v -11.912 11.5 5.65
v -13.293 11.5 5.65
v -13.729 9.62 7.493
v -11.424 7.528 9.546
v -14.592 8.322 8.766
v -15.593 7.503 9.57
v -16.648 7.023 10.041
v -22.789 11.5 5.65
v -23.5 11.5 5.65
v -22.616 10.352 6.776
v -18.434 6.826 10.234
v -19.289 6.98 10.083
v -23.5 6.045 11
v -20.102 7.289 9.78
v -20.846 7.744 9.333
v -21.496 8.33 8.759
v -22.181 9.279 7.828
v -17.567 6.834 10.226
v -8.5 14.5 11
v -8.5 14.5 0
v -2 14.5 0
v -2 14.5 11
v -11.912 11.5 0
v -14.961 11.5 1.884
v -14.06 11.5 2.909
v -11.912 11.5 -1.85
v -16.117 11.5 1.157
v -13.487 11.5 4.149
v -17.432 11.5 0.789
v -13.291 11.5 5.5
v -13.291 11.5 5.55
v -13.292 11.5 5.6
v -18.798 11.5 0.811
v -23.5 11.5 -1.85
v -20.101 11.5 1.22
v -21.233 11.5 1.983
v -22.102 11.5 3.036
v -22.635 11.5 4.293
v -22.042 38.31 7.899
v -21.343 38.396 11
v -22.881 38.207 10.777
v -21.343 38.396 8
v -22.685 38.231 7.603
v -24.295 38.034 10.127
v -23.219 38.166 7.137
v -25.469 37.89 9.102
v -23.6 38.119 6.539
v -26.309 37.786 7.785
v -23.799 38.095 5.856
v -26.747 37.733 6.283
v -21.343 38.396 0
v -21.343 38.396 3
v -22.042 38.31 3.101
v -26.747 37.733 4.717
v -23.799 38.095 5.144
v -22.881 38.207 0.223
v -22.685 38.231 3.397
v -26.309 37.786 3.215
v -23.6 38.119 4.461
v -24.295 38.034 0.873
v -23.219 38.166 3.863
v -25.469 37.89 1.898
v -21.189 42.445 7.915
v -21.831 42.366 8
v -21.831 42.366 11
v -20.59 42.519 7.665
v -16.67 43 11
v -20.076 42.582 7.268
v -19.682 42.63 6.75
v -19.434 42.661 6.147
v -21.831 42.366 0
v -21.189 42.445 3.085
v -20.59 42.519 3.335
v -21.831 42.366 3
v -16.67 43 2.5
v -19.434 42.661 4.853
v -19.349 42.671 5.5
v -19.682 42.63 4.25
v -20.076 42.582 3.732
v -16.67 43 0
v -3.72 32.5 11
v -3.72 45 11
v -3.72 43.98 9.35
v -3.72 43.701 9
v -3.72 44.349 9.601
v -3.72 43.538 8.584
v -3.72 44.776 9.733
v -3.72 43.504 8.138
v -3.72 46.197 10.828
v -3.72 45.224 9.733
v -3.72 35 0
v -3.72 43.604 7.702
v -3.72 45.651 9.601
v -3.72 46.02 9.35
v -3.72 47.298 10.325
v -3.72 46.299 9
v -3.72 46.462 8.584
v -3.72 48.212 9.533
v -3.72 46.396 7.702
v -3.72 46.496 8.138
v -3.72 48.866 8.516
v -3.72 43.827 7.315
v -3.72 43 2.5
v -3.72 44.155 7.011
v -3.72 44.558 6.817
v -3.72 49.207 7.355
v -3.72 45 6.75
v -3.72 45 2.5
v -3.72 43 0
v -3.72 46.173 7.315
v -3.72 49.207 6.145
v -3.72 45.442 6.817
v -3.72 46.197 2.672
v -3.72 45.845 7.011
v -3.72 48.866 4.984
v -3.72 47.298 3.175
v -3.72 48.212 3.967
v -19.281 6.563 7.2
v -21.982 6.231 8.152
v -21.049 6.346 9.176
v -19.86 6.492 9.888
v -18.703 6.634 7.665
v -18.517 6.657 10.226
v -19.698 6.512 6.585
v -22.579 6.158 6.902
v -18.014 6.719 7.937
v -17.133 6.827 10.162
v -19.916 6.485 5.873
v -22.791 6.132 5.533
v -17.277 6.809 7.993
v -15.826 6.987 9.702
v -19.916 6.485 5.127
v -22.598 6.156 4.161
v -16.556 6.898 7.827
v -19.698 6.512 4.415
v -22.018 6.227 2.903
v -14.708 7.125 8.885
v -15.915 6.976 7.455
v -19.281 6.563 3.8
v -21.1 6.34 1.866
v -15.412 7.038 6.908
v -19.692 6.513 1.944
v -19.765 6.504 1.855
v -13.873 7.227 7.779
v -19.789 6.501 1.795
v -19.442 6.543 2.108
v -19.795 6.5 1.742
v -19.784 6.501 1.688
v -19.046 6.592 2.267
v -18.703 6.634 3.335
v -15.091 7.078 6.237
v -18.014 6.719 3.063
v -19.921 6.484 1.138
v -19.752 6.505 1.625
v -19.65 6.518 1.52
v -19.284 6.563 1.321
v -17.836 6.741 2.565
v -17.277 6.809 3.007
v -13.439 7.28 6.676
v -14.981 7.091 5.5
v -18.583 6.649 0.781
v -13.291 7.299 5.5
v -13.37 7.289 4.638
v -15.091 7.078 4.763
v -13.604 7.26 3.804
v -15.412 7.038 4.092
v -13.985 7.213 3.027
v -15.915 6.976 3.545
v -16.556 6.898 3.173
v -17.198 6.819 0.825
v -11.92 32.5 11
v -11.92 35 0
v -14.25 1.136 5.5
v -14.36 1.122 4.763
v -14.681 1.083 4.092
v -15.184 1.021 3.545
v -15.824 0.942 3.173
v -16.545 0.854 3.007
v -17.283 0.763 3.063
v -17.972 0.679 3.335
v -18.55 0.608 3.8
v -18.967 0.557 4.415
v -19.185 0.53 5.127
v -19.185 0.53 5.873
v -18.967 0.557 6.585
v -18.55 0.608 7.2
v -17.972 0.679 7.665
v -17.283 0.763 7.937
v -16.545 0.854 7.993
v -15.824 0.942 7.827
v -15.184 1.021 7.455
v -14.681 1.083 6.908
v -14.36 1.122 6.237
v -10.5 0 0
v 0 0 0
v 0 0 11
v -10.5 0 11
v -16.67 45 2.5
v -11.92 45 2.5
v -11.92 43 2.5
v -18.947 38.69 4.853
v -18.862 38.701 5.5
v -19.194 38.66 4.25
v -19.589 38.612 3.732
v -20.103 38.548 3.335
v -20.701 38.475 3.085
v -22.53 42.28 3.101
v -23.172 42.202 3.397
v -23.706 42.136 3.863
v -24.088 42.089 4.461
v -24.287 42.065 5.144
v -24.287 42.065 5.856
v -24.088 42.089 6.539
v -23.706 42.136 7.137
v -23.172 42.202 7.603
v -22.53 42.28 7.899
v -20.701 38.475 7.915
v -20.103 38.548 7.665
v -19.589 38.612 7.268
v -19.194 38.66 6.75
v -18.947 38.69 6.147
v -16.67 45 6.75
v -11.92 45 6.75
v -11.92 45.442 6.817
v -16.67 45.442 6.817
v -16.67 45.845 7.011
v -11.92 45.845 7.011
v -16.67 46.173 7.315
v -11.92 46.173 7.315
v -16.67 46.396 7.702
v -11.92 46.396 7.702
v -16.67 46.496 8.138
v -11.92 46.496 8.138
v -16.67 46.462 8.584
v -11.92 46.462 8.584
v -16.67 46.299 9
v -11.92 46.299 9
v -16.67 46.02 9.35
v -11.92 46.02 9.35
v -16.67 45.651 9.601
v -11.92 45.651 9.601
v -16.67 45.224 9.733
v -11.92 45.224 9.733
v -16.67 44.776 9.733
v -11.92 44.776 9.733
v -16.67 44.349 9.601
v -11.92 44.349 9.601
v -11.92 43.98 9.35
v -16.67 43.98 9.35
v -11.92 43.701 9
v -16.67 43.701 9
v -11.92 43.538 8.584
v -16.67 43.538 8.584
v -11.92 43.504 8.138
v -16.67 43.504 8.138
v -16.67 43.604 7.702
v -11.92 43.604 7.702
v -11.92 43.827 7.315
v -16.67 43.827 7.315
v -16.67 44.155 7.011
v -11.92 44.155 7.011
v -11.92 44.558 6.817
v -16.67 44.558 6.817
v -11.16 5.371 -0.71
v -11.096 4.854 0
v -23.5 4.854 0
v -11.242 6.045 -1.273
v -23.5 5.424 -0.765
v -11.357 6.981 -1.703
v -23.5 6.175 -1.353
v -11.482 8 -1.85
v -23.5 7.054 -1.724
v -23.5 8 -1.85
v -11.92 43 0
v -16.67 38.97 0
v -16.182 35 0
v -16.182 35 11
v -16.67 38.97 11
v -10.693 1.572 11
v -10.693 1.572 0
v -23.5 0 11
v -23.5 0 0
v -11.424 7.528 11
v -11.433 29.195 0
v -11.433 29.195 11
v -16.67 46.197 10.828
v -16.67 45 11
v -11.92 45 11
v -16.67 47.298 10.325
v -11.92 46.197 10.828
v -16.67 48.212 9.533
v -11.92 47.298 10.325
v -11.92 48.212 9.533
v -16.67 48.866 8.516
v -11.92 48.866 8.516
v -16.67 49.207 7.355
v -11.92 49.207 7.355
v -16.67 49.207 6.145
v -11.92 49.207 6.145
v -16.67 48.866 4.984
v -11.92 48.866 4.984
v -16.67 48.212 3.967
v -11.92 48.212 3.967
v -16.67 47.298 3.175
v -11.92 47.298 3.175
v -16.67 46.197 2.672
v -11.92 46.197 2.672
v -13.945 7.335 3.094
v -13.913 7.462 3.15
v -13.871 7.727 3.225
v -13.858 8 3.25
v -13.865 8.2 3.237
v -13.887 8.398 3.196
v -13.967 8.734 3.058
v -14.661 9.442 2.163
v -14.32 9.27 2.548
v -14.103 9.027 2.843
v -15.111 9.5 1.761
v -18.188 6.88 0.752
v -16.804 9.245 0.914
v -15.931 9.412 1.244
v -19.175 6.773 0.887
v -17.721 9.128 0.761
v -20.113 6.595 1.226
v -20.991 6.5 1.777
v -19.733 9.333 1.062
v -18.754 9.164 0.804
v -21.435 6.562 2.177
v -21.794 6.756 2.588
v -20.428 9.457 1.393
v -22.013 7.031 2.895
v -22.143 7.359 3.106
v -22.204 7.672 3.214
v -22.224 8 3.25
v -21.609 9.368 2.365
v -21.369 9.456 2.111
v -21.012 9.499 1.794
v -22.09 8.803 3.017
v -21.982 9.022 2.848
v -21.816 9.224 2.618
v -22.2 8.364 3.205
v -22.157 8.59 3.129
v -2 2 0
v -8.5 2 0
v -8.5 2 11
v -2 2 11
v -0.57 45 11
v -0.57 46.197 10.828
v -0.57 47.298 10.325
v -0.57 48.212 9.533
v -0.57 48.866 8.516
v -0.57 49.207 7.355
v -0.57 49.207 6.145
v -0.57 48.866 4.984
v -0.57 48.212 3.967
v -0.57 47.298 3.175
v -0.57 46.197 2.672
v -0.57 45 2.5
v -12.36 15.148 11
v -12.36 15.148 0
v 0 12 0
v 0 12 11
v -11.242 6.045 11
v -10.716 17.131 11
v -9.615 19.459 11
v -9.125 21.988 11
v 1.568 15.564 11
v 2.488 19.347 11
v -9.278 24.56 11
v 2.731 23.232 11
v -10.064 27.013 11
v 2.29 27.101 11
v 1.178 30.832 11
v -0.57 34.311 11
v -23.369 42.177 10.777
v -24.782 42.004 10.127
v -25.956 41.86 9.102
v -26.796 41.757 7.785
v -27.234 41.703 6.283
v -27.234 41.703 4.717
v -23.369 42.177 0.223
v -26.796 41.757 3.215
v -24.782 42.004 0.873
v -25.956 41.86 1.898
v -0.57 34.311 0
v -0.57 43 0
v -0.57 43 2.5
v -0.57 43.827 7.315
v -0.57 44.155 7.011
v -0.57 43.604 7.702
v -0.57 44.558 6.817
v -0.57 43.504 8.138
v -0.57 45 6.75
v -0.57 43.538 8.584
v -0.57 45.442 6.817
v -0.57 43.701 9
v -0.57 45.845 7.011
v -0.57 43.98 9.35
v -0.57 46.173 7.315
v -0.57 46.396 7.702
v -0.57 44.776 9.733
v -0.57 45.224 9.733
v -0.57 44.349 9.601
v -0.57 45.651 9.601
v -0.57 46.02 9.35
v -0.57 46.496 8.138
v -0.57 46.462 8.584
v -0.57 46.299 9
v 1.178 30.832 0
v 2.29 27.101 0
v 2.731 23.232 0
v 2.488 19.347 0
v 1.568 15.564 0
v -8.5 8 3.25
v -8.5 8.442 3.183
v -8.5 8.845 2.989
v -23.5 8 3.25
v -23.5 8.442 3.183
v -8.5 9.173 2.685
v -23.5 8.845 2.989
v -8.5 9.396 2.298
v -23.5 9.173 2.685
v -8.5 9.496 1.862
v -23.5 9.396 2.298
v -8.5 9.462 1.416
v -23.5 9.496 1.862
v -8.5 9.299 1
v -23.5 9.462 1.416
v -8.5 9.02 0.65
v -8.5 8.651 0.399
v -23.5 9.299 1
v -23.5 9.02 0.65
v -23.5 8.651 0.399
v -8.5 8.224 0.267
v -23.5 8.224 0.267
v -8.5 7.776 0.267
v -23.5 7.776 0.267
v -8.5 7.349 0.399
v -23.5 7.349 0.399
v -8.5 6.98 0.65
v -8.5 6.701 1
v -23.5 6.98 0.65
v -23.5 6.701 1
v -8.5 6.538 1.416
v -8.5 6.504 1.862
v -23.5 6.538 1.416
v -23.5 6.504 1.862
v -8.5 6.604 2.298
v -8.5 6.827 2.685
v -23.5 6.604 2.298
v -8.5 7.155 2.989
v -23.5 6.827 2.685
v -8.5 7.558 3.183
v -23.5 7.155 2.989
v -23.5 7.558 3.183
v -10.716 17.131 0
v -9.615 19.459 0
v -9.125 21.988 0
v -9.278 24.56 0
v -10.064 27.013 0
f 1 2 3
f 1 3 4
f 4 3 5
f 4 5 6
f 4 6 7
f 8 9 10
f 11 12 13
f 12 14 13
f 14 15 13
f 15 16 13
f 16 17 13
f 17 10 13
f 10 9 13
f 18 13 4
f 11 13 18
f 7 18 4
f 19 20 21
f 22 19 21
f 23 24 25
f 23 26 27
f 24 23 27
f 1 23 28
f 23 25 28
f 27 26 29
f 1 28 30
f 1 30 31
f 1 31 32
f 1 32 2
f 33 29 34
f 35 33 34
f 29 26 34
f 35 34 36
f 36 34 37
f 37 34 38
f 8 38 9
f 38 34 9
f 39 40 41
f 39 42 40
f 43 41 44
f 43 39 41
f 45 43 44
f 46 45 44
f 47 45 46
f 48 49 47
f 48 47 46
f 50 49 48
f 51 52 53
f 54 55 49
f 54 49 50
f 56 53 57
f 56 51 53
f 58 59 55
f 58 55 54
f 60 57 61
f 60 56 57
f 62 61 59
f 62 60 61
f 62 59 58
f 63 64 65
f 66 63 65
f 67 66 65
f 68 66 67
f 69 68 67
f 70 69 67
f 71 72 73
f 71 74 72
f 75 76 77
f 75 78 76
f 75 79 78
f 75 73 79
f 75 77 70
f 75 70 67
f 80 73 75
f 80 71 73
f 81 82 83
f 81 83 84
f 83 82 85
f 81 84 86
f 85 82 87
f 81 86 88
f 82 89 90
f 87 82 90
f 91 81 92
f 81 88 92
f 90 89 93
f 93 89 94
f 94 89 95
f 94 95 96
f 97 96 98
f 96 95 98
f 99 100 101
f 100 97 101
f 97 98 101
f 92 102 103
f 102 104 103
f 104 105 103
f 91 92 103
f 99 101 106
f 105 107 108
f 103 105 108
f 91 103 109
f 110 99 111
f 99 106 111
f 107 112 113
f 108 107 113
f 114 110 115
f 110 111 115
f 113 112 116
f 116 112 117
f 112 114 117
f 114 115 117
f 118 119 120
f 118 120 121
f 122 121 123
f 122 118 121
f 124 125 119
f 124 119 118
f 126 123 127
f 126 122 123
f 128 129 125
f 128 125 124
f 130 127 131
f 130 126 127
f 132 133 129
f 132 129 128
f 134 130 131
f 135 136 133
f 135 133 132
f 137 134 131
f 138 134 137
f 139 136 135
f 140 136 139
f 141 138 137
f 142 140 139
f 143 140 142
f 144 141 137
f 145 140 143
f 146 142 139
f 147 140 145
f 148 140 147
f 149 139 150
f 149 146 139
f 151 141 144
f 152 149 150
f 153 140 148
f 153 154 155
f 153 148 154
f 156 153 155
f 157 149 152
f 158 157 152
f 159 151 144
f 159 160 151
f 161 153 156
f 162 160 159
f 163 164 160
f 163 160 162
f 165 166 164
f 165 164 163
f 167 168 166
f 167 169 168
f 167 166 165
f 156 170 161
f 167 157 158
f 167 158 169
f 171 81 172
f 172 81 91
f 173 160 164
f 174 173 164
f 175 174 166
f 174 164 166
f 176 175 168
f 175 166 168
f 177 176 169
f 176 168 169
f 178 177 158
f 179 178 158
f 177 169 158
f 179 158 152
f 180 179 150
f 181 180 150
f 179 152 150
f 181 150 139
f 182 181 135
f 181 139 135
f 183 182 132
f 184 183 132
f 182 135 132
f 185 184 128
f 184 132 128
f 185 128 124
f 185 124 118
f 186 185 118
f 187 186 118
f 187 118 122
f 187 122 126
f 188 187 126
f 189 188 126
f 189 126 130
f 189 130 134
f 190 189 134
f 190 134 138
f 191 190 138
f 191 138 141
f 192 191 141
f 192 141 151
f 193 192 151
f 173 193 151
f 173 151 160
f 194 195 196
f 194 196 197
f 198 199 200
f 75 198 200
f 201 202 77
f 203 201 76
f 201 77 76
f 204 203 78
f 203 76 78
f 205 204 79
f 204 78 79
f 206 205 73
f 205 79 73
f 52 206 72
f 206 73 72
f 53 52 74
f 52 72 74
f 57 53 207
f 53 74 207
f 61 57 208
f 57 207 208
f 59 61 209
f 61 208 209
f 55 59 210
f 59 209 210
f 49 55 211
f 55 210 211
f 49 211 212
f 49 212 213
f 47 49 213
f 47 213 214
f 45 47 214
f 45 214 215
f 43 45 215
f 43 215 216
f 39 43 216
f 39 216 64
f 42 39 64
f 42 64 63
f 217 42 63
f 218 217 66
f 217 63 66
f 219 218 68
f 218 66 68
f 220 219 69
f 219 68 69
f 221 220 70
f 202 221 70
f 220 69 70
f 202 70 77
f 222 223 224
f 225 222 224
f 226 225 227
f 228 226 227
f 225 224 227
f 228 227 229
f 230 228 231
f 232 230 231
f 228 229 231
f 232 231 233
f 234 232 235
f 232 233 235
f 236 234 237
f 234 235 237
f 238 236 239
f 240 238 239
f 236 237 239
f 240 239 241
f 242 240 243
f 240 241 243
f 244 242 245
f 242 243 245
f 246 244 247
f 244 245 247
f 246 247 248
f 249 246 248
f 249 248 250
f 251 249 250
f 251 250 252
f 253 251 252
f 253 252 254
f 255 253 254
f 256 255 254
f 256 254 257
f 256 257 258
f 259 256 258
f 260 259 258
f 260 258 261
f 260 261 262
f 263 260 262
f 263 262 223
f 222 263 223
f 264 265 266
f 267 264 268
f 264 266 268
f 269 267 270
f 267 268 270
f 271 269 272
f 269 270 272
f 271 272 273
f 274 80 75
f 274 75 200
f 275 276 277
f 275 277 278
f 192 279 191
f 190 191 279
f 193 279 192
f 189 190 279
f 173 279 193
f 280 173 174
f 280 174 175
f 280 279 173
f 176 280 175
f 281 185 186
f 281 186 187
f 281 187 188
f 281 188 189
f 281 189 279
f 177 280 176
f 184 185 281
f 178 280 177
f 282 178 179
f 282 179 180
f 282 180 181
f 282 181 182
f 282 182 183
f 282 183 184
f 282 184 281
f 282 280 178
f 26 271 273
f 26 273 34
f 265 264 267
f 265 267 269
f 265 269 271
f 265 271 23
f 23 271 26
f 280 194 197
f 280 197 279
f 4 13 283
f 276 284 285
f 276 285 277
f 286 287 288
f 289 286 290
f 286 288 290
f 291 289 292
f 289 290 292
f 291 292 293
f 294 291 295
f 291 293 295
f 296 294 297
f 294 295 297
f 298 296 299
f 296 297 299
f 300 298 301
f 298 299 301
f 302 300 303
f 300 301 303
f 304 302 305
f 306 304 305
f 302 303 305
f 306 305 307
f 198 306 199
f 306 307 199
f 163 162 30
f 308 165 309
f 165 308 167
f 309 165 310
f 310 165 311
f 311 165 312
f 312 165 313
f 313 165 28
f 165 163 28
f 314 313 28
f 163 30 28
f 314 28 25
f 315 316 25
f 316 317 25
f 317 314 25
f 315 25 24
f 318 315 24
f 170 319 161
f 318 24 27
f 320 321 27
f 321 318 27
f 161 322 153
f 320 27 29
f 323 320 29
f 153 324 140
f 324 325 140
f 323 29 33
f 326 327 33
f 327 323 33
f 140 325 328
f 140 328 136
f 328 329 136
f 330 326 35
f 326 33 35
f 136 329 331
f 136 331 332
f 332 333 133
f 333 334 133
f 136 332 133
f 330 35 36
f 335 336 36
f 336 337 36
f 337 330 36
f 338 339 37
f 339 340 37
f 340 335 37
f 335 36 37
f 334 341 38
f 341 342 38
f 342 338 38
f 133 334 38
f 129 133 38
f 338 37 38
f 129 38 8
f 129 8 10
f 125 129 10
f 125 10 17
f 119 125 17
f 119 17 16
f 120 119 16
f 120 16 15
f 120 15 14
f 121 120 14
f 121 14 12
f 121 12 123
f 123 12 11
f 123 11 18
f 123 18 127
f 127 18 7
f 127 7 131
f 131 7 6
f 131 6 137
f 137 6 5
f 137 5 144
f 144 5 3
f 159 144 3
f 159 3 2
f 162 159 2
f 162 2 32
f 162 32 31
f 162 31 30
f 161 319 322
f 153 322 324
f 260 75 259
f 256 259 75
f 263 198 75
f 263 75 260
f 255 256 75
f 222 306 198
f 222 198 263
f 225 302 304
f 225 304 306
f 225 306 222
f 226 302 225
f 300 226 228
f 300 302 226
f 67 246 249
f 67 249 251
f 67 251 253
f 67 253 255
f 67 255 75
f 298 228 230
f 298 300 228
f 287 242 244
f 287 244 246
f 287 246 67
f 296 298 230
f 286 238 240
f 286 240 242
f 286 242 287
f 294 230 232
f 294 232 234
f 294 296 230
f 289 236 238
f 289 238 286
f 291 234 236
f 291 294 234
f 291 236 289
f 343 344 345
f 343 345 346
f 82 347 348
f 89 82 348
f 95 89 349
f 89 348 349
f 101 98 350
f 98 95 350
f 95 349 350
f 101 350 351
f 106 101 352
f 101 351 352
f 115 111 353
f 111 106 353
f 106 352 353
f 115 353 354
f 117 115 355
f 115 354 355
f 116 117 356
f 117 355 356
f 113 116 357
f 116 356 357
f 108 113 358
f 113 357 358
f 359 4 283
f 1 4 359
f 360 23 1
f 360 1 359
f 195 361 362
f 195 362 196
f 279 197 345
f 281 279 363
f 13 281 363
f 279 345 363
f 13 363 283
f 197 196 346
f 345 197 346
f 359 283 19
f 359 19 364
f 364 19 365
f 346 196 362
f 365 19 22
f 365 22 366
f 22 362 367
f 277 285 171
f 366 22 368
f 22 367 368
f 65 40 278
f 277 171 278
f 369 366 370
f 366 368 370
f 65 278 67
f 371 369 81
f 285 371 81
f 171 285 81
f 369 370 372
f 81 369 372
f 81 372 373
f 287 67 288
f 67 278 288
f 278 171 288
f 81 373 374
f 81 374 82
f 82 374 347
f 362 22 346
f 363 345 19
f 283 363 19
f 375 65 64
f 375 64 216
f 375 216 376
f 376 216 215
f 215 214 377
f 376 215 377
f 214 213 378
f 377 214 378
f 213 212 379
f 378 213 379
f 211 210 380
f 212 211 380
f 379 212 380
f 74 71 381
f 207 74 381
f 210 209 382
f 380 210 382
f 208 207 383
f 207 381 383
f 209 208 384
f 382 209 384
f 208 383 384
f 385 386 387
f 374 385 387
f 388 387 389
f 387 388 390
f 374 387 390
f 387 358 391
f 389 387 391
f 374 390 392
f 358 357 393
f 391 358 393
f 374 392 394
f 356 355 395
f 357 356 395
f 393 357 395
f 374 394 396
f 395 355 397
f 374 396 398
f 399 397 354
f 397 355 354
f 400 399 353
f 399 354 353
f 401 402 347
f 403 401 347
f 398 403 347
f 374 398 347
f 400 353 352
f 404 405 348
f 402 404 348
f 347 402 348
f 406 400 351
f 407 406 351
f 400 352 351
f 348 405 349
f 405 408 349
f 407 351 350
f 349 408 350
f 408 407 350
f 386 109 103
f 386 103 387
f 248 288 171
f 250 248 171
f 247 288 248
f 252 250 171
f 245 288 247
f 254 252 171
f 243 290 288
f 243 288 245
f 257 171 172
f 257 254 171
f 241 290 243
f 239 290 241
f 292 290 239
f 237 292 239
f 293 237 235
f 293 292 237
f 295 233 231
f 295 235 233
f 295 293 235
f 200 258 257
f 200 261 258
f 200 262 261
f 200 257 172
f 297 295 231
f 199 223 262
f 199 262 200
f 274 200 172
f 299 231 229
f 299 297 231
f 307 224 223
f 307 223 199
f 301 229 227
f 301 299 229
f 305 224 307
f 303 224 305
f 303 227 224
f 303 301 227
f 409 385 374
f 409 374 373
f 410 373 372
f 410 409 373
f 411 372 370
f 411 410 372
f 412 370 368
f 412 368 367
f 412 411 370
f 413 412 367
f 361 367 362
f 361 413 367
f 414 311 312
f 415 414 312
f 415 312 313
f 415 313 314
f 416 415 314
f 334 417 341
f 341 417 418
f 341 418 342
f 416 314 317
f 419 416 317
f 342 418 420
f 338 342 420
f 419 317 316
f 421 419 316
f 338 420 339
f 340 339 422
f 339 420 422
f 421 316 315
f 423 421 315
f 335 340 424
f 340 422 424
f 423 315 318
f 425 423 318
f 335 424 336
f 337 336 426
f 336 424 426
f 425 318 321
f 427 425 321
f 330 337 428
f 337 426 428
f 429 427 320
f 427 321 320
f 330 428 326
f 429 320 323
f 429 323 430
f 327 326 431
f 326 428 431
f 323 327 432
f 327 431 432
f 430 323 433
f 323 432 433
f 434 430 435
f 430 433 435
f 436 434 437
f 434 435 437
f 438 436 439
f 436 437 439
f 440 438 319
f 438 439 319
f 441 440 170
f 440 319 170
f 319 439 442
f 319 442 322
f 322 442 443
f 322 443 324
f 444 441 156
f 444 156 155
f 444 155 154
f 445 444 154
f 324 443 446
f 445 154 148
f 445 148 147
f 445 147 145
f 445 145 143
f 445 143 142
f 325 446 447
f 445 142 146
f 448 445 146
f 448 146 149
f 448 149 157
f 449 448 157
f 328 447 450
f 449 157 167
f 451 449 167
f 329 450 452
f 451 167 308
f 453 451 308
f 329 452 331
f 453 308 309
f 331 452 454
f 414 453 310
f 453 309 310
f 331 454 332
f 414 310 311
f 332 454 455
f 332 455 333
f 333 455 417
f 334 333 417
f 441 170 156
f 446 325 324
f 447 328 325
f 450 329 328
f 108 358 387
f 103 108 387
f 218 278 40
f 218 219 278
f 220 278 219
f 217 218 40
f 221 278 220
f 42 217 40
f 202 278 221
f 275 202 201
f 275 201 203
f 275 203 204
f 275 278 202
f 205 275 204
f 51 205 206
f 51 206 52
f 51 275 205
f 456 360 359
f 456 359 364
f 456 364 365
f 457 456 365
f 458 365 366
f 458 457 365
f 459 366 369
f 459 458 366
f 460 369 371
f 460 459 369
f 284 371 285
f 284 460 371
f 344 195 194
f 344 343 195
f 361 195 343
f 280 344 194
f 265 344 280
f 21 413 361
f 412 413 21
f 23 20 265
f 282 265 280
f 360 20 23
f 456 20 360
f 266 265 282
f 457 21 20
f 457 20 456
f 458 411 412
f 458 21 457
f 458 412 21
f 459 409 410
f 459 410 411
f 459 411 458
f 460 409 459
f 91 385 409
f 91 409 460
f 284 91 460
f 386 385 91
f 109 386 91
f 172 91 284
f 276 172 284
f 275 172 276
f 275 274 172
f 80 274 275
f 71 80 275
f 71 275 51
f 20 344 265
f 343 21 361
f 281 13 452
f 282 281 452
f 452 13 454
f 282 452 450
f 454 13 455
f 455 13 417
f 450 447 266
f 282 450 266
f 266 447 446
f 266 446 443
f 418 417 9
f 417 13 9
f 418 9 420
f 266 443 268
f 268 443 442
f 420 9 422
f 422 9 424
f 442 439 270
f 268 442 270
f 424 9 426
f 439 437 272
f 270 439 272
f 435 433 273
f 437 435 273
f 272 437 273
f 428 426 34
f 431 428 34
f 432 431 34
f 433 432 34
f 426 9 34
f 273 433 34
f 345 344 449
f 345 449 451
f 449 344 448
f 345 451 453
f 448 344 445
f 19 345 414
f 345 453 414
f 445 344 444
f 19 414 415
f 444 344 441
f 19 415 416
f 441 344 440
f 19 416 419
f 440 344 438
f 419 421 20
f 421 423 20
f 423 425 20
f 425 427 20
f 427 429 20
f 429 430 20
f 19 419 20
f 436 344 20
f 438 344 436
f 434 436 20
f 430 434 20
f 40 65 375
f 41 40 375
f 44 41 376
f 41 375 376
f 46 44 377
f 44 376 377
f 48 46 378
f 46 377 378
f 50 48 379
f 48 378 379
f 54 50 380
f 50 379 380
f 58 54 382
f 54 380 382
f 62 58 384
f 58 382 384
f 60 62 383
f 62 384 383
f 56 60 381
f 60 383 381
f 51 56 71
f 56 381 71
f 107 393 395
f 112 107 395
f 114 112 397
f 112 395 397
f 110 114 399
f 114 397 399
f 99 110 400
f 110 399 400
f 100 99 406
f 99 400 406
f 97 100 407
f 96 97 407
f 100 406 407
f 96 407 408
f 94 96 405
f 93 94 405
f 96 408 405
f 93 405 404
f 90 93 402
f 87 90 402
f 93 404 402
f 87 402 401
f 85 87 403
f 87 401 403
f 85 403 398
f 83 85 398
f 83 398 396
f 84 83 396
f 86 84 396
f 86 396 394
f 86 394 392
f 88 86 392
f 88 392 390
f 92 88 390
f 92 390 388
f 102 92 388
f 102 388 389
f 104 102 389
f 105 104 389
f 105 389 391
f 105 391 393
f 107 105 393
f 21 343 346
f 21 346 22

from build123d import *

# Parameters (mm, degrees)
SKETCH1_W                  = 6.5
SKETCH1_H                  = 12.5
MAIN_BASE_DEPTH            = 11
TOP_LINK_HOLES_DEPTH       = 16.1
STEERING_MOUNT_BOSS_DEPTH  = 4
CUT_FOR_LINK_DEPTH         = 4.1
BOSS_EXTRUDE6_REACH        = 28.238
SKETCH4_R                  = 2.5
STEERING_MOUNT_HOLES_DEPTH = 41.847064
SKETCH13_R                 = 1.5
CUT_EXTRUDE8_DEPTH         = 15
CUT_EXTRUDE9_REACH         = 13.5
SKETCH14_R                 = 4.75
SKETCH15_R                 = 1.5
CUT_EXTRUDE10_DEPTH        = 16.1


with BuildPart() as part:
    # Sketch1 → Main Base (new body)
    with BuildSketch(Plane.XY):
        with BuildLine():
            Line((0, 0), (-10.5, 0))
            Line((-10.5, 0), (-10.693077779, 1.572492321))
            Line((-10.693077779, 1.572492321), (-23.5, 0))
            Line((-23.5, 0), (-23.5, 6.045058953))
            Line((-23.5, 6.045058953), (-11.42429384, 7.527769231))
            Line((-11.42429384, 7.527769231), (-12.359894337, 15.1476238))
            ThreePointArc((-12.359894337, 15.1476238), (-9.125383898, 21.988425282), (-11.433037505, 29.194905528))
            Line((-11.433037505, 29.194905528), (-16.182087698, 34.999776092))
            Line((-16.182087698, 34.999776092), (-16.669565072, 38.969960698))
            Line((-16.669565072, 38.969960698), (-21.343327687, 38.396094808))
            Line((-21.343327687, 38.396094808), (-21.83080506, 42.366279414))
            Line((-21.83080506, 42.366279414), (-16.669565072, 43))
            Line((-16.669565072, 43), (-0.569565072, 43))
            Line((-0.569565072, 43), (-0.569565072, 34.310888907))
            ThreePointArc((-0.569565072, 34.310888907), (2.730584507, 23.23242246), (0, 12))
            Line((0, 12), (0, 0))
        make_face()
        with Locations((-5.25, 8.25)):
            Rectangle(SKETCH1_W, SKETCH1_H, mode=Mode.SUBTRACT)
    extrude(amount=MAIN_BASE_DEPTH)

    # Sketch2 → Top Link Holes (add)
    with BuildSketch(Plane(origin=(-0.569565072, 0, 0), x_dir=(0, 0, -1), z_dir=(1, 0, 0))):
        with BuildLine():
            Line((-11, 43), (-11, 45))
            ThreePointArc((-11, 45), (-6.75, 49.25), (-2.5, 45))
            Line((-2.5, 45), (-2.5, 43))
            Line((-2.5, 43), (-11, 43))
        make_face()
    extrude(amount=-TOP_LINK_HOLES_DEPTH)

    # Sketch3 → Steering Mount Boss (add)
    with BuildSketch(Plane(origin=(-5.448899417, 44.377724505, 0), x_dir=(0.992546152, 0.121869343, 0), z_dir=(-0.121869343, 0.992546152, 0))):
        with BuildLine():
            Line((-16.504930895, 0), (-16.504930895, -11))
            ThreePointArc((-16.504930895, -11), (-22.004930895, -5.5), (-16.504930895, 0))
        make_face()
    extrude(amount=-STEERING_MOUNT_BOSS_DEPTH)

    # Sketch5 → Cut for Link (cut, symmetric)
    with BuildSketch(Plane(origin=(-7.819565072, 0, 0), x_dir=(0, 0, -1), z_dir=(1, 0, 0))):
        with BuildLine():
            Line((-11, 32.5), (0, 35))
            Line((0, 35), (0, 43))
            Line((0, 43), (-2.5, 43))
            Line((-2.5, 43), (-2.5, 45))
            ThreePointArc((-2.5, 45), (-6.75, 49.25), (-11, 45))
            Line((-11, 45), (-11, 32.5))
        make_face()
    extrude(amount=CUT_FOR_LINK_DEPTH, both=True, mode=Mode.SUBTRACT)

    # Boss-Extrude6: up to this face of the body (flat: up to its plane)
    boss_extrude6_end = Plane(part.part.faces().sort_by_distance((-11.892094088, 11.337696516, 5.5))[0])
    # Sketch12 → Boss-Extrude6 (add, up to the picked face)
    with BuildSketch(Plane.ZY.offset(23.5), mode=Mode.PRIVATE) as boss_extrude6_sk1:
        with BuildLine():
            Line((11, 6.045058953), (0, 6.045058953))
            Line((0, 6.045058953), (0, 4.853970757))
            ThreePointArc((0, 4.853970757), (-1.35322413, 6.175171241), (-1.85, 8))
            Line((-1.85, 8), (-1.85, 11.5))
            Line((-1.85, 11.5), (5.65, 11.5))
            Line((5.65, 11.5), (11, 6.045058953))
        make_face()
    boss_extrude6_tool1 = split(extrude(boss_extrude6_sk1.sketch, amount=-BOSS_EXTRUDE6_REACH, mode=Mode.PRIVATE), bisect_by=boss_extrude6_end, keep=Keep.BOTH, mode=Mode.PRIVATE)
    add(boss_extrude6_tool1.solids().sort_by_distance((-23.5, 8.500537, 3.327239))[0])

    # Sketch4 → Steering mount holes (cut)
    with BuildSketch(Plane(origin=(-5.448899417, 44.377724505, 0), x_dir=(0.992546152, 0.121869343, 0), z_dir=(-0.121869343, 0.992546152, 0))):
        with Locations((-16.504930895, -5.5)):
            Circle(SKETCH4_R)
    extrude(amount=-STEERING_MOUNT_HOLES_DEPTH, mode=Mode.SUBTRACT)

    # Sketch13 → Cut-Extrude8 (cut)
    with BuildSketch(Plane.ZY.offset(23.5)):
        with Locations((1.75, 8)):
            Circle(SKETCH13_R)
    extrude(amount=-CUT_EXTRUDE8_DEPTH, mode=Mode.SUBTRACT)

    # Cut-Extrude9: up to this face of the body (flat: up to its plane)
    cut_extrude9_end = Plane(part.part.faces().sort_by_distance((-15.449529226, 7.033532472, 10.515271267))[0])
    # Sketch14 → Cut-Extrude9 (cut, up to the picked face)
    with BuildSketch(Plane(origin=(0, 11.5, 0), x_dir=(1, 0, 0), z_dir=(0, 1, 0)), mode=Mode.PRIVATE) as cut_extrude9_sk1:
        with Locations((-18.040902496, -5.5)):
            Circle(SKETCH14_R)
    cut_extrude9_tool1 = split(extrude(cut_extrude9_sk1.sketch, amount=-CUT_EXTRUDE9_REACH, mode=Mode.PRIVATE), bisect_by=cut_extrude9_end, keep=Keep.BOTH, mode=Mode.PRIVATE)
    add(cut_extrude9_tool1.solids().sort_by_distance((-18.040902, 11.5, 5.5))[0], mode=Mode.SUBTRACT)

    # Sketch15 → Cut-Extrude10 (cut)
    with BuildSketch(Plane(origin=(-0.569565072, 0, 0), x_dir=(0, 0, -1), z_dir=(1, 0, 0))):
        with Locations((-8.25, 45)):
            Circle(SKETCH15_R)
    extrude(amount=-CUT_EXTRUDE10_DEPTH, mode=Mode.SUBTRACT)


solid = part.part
